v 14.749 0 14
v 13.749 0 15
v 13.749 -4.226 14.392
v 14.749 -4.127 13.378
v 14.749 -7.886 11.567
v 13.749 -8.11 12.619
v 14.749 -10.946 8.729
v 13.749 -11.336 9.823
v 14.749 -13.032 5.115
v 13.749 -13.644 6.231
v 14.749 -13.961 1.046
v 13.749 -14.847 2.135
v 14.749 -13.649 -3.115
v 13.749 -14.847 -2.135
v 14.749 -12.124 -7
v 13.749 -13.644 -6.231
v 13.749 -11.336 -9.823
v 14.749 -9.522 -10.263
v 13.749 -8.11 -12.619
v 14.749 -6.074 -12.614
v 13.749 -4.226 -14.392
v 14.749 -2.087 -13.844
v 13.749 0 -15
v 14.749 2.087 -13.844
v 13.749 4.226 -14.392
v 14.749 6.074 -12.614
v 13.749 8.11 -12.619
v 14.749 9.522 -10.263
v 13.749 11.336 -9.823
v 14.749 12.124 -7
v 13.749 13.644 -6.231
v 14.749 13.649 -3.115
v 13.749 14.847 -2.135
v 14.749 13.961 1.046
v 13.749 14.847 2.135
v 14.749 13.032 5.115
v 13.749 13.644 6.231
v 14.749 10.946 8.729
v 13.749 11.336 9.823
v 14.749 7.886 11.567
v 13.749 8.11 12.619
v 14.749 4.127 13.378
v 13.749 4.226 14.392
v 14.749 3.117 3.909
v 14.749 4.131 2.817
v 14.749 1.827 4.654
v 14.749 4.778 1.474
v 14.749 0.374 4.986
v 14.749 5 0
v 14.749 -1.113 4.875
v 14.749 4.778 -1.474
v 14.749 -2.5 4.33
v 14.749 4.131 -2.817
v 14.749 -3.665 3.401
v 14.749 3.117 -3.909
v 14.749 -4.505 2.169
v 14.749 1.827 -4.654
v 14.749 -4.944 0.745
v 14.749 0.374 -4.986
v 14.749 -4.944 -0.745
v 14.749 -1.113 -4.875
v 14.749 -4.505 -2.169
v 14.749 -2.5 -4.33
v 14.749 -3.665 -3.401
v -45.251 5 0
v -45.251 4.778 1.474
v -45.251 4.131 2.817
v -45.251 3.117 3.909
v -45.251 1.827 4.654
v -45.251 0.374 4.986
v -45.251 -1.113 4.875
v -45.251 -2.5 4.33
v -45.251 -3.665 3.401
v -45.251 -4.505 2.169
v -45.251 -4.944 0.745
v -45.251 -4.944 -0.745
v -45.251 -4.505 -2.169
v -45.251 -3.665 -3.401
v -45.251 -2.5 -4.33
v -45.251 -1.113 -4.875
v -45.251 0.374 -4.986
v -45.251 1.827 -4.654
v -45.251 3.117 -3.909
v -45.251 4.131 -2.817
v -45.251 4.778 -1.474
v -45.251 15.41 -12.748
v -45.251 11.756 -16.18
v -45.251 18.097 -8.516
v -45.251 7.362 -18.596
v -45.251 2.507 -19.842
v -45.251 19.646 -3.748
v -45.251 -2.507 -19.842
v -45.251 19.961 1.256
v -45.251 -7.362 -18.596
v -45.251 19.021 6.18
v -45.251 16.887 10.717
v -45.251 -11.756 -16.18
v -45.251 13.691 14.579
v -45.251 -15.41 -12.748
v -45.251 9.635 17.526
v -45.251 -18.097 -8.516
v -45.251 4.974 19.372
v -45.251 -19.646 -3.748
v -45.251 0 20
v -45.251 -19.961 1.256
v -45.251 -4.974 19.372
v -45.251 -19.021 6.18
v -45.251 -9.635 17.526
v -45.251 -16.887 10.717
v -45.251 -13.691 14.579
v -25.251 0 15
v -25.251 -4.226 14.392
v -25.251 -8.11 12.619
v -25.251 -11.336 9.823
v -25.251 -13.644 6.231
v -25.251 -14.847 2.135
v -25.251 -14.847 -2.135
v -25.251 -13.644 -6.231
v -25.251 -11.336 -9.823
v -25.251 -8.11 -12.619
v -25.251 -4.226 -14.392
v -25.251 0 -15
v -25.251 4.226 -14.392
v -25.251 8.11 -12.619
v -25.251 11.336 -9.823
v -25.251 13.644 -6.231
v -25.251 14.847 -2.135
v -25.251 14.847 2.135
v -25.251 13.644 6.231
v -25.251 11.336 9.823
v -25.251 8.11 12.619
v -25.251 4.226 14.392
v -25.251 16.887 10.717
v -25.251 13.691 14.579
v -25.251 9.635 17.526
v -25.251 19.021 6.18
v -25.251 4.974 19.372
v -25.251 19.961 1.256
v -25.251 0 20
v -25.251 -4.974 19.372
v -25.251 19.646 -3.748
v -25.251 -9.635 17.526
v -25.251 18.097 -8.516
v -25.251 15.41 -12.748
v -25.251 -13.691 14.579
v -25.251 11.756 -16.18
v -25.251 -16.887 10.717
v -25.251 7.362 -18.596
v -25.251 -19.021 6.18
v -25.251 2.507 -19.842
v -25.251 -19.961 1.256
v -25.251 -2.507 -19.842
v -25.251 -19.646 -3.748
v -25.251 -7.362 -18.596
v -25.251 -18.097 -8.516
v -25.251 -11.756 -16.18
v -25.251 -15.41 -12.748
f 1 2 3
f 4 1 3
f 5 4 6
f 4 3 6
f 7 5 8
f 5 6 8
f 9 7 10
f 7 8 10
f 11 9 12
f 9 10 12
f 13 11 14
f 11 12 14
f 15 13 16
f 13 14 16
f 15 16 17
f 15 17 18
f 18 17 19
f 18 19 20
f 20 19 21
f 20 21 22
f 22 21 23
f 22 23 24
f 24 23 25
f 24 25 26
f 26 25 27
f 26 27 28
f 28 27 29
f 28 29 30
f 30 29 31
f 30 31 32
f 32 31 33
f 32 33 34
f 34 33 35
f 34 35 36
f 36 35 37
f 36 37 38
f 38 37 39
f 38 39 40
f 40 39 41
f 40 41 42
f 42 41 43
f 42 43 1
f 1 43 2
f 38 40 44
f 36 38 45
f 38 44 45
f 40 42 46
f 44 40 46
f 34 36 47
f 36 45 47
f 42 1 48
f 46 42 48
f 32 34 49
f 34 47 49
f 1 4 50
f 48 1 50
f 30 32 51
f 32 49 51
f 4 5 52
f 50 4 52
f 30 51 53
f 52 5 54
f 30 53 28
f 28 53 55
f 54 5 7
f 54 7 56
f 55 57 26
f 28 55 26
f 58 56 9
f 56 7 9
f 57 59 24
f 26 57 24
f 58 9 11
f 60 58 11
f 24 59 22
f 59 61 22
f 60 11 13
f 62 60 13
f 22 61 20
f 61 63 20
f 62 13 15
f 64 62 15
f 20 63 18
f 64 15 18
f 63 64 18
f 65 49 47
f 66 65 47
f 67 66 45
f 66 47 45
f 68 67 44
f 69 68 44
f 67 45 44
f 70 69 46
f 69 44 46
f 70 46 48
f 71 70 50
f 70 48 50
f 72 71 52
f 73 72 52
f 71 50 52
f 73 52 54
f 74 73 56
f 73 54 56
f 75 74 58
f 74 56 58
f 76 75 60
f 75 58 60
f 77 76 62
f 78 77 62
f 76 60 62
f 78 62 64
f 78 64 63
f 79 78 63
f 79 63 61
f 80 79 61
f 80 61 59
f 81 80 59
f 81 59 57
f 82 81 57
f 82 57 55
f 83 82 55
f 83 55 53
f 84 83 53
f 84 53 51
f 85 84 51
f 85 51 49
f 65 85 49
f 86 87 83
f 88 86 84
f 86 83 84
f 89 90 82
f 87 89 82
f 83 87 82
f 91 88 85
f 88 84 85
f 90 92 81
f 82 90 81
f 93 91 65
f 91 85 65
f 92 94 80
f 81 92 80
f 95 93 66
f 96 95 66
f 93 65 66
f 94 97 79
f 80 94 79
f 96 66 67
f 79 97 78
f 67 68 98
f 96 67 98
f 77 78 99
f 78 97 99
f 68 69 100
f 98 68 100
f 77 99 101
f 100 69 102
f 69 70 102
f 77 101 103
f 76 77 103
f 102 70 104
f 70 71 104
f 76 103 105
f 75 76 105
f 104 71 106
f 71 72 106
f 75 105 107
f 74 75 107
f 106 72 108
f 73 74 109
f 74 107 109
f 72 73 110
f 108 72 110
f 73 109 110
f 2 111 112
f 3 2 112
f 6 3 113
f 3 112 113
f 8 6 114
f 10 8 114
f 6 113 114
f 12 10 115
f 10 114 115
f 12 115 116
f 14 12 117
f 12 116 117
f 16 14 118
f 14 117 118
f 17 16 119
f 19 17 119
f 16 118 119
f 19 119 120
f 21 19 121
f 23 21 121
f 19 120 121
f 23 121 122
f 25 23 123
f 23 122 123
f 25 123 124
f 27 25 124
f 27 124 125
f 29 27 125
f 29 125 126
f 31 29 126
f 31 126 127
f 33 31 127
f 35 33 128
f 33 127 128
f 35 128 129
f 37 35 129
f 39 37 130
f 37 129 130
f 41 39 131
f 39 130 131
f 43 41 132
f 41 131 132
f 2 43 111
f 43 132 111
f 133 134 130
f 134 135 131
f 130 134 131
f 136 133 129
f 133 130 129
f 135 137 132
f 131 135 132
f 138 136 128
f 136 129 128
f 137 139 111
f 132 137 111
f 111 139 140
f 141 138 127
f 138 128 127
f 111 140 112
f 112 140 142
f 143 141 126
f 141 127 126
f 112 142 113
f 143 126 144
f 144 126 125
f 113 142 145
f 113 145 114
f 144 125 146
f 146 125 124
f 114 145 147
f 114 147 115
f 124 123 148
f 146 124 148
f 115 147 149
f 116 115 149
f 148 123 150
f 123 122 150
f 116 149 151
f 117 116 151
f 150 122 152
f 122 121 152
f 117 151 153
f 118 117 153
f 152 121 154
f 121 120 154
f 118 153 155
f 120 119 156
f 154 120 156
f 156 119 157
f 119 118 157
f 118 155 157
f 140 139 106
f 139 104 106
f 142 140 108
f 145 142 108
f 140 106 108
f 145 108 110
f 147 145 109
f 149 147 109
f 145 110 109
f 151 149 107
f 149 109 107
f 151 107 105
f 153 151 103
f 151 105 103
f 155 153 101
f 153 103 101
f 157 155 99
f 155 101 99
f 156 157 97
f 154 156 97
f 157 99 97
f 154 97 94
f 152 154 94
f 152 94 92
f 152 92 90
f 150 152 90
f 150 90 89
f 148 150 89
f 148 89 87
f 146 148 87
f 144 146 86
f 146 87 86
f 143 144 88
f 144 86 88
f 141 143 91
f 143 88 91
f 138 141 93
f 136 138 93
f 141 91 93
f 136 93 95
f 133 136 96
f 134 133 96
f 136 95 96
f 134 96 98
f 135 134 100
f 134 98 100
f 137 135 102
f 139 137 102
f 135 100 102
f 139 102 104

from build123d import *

# Parameters (mm, degrees)
F2_SIZE  = 1
F3_R     = 5
F4_DEPTH = 60.001


with BuildPart() as f1:
    # F0 (on Front) → F1 (revolve)
    with BuildSketch(Plane.XZ):
        Polygon((-45.251393, 20), (-45.251393, 0), (14.748607, 0), (14.748607, 15), (-25.251393, 15), (-25.251393, 20), align=None)
    revolve(axis=Axis((-14.02186, 0, 0), (1, 0, 0)))

    # F2
    f2_edges = [f1.edges().sort_by_distance(p)[0] for p in [
        (14.748607, 0, -15),
    ]]
    chamfer(f2_edges, length=F2_SIZE)

    # F3 (on face) → F4 (cut, through all)
    with BuildSketch(Plane.YZ.offset(14.748607)):
        Circle(F3_R)
    extrude(amount=-F4_DEPTH, mode=Mode.SUBTRACT)


solid = f1.part
